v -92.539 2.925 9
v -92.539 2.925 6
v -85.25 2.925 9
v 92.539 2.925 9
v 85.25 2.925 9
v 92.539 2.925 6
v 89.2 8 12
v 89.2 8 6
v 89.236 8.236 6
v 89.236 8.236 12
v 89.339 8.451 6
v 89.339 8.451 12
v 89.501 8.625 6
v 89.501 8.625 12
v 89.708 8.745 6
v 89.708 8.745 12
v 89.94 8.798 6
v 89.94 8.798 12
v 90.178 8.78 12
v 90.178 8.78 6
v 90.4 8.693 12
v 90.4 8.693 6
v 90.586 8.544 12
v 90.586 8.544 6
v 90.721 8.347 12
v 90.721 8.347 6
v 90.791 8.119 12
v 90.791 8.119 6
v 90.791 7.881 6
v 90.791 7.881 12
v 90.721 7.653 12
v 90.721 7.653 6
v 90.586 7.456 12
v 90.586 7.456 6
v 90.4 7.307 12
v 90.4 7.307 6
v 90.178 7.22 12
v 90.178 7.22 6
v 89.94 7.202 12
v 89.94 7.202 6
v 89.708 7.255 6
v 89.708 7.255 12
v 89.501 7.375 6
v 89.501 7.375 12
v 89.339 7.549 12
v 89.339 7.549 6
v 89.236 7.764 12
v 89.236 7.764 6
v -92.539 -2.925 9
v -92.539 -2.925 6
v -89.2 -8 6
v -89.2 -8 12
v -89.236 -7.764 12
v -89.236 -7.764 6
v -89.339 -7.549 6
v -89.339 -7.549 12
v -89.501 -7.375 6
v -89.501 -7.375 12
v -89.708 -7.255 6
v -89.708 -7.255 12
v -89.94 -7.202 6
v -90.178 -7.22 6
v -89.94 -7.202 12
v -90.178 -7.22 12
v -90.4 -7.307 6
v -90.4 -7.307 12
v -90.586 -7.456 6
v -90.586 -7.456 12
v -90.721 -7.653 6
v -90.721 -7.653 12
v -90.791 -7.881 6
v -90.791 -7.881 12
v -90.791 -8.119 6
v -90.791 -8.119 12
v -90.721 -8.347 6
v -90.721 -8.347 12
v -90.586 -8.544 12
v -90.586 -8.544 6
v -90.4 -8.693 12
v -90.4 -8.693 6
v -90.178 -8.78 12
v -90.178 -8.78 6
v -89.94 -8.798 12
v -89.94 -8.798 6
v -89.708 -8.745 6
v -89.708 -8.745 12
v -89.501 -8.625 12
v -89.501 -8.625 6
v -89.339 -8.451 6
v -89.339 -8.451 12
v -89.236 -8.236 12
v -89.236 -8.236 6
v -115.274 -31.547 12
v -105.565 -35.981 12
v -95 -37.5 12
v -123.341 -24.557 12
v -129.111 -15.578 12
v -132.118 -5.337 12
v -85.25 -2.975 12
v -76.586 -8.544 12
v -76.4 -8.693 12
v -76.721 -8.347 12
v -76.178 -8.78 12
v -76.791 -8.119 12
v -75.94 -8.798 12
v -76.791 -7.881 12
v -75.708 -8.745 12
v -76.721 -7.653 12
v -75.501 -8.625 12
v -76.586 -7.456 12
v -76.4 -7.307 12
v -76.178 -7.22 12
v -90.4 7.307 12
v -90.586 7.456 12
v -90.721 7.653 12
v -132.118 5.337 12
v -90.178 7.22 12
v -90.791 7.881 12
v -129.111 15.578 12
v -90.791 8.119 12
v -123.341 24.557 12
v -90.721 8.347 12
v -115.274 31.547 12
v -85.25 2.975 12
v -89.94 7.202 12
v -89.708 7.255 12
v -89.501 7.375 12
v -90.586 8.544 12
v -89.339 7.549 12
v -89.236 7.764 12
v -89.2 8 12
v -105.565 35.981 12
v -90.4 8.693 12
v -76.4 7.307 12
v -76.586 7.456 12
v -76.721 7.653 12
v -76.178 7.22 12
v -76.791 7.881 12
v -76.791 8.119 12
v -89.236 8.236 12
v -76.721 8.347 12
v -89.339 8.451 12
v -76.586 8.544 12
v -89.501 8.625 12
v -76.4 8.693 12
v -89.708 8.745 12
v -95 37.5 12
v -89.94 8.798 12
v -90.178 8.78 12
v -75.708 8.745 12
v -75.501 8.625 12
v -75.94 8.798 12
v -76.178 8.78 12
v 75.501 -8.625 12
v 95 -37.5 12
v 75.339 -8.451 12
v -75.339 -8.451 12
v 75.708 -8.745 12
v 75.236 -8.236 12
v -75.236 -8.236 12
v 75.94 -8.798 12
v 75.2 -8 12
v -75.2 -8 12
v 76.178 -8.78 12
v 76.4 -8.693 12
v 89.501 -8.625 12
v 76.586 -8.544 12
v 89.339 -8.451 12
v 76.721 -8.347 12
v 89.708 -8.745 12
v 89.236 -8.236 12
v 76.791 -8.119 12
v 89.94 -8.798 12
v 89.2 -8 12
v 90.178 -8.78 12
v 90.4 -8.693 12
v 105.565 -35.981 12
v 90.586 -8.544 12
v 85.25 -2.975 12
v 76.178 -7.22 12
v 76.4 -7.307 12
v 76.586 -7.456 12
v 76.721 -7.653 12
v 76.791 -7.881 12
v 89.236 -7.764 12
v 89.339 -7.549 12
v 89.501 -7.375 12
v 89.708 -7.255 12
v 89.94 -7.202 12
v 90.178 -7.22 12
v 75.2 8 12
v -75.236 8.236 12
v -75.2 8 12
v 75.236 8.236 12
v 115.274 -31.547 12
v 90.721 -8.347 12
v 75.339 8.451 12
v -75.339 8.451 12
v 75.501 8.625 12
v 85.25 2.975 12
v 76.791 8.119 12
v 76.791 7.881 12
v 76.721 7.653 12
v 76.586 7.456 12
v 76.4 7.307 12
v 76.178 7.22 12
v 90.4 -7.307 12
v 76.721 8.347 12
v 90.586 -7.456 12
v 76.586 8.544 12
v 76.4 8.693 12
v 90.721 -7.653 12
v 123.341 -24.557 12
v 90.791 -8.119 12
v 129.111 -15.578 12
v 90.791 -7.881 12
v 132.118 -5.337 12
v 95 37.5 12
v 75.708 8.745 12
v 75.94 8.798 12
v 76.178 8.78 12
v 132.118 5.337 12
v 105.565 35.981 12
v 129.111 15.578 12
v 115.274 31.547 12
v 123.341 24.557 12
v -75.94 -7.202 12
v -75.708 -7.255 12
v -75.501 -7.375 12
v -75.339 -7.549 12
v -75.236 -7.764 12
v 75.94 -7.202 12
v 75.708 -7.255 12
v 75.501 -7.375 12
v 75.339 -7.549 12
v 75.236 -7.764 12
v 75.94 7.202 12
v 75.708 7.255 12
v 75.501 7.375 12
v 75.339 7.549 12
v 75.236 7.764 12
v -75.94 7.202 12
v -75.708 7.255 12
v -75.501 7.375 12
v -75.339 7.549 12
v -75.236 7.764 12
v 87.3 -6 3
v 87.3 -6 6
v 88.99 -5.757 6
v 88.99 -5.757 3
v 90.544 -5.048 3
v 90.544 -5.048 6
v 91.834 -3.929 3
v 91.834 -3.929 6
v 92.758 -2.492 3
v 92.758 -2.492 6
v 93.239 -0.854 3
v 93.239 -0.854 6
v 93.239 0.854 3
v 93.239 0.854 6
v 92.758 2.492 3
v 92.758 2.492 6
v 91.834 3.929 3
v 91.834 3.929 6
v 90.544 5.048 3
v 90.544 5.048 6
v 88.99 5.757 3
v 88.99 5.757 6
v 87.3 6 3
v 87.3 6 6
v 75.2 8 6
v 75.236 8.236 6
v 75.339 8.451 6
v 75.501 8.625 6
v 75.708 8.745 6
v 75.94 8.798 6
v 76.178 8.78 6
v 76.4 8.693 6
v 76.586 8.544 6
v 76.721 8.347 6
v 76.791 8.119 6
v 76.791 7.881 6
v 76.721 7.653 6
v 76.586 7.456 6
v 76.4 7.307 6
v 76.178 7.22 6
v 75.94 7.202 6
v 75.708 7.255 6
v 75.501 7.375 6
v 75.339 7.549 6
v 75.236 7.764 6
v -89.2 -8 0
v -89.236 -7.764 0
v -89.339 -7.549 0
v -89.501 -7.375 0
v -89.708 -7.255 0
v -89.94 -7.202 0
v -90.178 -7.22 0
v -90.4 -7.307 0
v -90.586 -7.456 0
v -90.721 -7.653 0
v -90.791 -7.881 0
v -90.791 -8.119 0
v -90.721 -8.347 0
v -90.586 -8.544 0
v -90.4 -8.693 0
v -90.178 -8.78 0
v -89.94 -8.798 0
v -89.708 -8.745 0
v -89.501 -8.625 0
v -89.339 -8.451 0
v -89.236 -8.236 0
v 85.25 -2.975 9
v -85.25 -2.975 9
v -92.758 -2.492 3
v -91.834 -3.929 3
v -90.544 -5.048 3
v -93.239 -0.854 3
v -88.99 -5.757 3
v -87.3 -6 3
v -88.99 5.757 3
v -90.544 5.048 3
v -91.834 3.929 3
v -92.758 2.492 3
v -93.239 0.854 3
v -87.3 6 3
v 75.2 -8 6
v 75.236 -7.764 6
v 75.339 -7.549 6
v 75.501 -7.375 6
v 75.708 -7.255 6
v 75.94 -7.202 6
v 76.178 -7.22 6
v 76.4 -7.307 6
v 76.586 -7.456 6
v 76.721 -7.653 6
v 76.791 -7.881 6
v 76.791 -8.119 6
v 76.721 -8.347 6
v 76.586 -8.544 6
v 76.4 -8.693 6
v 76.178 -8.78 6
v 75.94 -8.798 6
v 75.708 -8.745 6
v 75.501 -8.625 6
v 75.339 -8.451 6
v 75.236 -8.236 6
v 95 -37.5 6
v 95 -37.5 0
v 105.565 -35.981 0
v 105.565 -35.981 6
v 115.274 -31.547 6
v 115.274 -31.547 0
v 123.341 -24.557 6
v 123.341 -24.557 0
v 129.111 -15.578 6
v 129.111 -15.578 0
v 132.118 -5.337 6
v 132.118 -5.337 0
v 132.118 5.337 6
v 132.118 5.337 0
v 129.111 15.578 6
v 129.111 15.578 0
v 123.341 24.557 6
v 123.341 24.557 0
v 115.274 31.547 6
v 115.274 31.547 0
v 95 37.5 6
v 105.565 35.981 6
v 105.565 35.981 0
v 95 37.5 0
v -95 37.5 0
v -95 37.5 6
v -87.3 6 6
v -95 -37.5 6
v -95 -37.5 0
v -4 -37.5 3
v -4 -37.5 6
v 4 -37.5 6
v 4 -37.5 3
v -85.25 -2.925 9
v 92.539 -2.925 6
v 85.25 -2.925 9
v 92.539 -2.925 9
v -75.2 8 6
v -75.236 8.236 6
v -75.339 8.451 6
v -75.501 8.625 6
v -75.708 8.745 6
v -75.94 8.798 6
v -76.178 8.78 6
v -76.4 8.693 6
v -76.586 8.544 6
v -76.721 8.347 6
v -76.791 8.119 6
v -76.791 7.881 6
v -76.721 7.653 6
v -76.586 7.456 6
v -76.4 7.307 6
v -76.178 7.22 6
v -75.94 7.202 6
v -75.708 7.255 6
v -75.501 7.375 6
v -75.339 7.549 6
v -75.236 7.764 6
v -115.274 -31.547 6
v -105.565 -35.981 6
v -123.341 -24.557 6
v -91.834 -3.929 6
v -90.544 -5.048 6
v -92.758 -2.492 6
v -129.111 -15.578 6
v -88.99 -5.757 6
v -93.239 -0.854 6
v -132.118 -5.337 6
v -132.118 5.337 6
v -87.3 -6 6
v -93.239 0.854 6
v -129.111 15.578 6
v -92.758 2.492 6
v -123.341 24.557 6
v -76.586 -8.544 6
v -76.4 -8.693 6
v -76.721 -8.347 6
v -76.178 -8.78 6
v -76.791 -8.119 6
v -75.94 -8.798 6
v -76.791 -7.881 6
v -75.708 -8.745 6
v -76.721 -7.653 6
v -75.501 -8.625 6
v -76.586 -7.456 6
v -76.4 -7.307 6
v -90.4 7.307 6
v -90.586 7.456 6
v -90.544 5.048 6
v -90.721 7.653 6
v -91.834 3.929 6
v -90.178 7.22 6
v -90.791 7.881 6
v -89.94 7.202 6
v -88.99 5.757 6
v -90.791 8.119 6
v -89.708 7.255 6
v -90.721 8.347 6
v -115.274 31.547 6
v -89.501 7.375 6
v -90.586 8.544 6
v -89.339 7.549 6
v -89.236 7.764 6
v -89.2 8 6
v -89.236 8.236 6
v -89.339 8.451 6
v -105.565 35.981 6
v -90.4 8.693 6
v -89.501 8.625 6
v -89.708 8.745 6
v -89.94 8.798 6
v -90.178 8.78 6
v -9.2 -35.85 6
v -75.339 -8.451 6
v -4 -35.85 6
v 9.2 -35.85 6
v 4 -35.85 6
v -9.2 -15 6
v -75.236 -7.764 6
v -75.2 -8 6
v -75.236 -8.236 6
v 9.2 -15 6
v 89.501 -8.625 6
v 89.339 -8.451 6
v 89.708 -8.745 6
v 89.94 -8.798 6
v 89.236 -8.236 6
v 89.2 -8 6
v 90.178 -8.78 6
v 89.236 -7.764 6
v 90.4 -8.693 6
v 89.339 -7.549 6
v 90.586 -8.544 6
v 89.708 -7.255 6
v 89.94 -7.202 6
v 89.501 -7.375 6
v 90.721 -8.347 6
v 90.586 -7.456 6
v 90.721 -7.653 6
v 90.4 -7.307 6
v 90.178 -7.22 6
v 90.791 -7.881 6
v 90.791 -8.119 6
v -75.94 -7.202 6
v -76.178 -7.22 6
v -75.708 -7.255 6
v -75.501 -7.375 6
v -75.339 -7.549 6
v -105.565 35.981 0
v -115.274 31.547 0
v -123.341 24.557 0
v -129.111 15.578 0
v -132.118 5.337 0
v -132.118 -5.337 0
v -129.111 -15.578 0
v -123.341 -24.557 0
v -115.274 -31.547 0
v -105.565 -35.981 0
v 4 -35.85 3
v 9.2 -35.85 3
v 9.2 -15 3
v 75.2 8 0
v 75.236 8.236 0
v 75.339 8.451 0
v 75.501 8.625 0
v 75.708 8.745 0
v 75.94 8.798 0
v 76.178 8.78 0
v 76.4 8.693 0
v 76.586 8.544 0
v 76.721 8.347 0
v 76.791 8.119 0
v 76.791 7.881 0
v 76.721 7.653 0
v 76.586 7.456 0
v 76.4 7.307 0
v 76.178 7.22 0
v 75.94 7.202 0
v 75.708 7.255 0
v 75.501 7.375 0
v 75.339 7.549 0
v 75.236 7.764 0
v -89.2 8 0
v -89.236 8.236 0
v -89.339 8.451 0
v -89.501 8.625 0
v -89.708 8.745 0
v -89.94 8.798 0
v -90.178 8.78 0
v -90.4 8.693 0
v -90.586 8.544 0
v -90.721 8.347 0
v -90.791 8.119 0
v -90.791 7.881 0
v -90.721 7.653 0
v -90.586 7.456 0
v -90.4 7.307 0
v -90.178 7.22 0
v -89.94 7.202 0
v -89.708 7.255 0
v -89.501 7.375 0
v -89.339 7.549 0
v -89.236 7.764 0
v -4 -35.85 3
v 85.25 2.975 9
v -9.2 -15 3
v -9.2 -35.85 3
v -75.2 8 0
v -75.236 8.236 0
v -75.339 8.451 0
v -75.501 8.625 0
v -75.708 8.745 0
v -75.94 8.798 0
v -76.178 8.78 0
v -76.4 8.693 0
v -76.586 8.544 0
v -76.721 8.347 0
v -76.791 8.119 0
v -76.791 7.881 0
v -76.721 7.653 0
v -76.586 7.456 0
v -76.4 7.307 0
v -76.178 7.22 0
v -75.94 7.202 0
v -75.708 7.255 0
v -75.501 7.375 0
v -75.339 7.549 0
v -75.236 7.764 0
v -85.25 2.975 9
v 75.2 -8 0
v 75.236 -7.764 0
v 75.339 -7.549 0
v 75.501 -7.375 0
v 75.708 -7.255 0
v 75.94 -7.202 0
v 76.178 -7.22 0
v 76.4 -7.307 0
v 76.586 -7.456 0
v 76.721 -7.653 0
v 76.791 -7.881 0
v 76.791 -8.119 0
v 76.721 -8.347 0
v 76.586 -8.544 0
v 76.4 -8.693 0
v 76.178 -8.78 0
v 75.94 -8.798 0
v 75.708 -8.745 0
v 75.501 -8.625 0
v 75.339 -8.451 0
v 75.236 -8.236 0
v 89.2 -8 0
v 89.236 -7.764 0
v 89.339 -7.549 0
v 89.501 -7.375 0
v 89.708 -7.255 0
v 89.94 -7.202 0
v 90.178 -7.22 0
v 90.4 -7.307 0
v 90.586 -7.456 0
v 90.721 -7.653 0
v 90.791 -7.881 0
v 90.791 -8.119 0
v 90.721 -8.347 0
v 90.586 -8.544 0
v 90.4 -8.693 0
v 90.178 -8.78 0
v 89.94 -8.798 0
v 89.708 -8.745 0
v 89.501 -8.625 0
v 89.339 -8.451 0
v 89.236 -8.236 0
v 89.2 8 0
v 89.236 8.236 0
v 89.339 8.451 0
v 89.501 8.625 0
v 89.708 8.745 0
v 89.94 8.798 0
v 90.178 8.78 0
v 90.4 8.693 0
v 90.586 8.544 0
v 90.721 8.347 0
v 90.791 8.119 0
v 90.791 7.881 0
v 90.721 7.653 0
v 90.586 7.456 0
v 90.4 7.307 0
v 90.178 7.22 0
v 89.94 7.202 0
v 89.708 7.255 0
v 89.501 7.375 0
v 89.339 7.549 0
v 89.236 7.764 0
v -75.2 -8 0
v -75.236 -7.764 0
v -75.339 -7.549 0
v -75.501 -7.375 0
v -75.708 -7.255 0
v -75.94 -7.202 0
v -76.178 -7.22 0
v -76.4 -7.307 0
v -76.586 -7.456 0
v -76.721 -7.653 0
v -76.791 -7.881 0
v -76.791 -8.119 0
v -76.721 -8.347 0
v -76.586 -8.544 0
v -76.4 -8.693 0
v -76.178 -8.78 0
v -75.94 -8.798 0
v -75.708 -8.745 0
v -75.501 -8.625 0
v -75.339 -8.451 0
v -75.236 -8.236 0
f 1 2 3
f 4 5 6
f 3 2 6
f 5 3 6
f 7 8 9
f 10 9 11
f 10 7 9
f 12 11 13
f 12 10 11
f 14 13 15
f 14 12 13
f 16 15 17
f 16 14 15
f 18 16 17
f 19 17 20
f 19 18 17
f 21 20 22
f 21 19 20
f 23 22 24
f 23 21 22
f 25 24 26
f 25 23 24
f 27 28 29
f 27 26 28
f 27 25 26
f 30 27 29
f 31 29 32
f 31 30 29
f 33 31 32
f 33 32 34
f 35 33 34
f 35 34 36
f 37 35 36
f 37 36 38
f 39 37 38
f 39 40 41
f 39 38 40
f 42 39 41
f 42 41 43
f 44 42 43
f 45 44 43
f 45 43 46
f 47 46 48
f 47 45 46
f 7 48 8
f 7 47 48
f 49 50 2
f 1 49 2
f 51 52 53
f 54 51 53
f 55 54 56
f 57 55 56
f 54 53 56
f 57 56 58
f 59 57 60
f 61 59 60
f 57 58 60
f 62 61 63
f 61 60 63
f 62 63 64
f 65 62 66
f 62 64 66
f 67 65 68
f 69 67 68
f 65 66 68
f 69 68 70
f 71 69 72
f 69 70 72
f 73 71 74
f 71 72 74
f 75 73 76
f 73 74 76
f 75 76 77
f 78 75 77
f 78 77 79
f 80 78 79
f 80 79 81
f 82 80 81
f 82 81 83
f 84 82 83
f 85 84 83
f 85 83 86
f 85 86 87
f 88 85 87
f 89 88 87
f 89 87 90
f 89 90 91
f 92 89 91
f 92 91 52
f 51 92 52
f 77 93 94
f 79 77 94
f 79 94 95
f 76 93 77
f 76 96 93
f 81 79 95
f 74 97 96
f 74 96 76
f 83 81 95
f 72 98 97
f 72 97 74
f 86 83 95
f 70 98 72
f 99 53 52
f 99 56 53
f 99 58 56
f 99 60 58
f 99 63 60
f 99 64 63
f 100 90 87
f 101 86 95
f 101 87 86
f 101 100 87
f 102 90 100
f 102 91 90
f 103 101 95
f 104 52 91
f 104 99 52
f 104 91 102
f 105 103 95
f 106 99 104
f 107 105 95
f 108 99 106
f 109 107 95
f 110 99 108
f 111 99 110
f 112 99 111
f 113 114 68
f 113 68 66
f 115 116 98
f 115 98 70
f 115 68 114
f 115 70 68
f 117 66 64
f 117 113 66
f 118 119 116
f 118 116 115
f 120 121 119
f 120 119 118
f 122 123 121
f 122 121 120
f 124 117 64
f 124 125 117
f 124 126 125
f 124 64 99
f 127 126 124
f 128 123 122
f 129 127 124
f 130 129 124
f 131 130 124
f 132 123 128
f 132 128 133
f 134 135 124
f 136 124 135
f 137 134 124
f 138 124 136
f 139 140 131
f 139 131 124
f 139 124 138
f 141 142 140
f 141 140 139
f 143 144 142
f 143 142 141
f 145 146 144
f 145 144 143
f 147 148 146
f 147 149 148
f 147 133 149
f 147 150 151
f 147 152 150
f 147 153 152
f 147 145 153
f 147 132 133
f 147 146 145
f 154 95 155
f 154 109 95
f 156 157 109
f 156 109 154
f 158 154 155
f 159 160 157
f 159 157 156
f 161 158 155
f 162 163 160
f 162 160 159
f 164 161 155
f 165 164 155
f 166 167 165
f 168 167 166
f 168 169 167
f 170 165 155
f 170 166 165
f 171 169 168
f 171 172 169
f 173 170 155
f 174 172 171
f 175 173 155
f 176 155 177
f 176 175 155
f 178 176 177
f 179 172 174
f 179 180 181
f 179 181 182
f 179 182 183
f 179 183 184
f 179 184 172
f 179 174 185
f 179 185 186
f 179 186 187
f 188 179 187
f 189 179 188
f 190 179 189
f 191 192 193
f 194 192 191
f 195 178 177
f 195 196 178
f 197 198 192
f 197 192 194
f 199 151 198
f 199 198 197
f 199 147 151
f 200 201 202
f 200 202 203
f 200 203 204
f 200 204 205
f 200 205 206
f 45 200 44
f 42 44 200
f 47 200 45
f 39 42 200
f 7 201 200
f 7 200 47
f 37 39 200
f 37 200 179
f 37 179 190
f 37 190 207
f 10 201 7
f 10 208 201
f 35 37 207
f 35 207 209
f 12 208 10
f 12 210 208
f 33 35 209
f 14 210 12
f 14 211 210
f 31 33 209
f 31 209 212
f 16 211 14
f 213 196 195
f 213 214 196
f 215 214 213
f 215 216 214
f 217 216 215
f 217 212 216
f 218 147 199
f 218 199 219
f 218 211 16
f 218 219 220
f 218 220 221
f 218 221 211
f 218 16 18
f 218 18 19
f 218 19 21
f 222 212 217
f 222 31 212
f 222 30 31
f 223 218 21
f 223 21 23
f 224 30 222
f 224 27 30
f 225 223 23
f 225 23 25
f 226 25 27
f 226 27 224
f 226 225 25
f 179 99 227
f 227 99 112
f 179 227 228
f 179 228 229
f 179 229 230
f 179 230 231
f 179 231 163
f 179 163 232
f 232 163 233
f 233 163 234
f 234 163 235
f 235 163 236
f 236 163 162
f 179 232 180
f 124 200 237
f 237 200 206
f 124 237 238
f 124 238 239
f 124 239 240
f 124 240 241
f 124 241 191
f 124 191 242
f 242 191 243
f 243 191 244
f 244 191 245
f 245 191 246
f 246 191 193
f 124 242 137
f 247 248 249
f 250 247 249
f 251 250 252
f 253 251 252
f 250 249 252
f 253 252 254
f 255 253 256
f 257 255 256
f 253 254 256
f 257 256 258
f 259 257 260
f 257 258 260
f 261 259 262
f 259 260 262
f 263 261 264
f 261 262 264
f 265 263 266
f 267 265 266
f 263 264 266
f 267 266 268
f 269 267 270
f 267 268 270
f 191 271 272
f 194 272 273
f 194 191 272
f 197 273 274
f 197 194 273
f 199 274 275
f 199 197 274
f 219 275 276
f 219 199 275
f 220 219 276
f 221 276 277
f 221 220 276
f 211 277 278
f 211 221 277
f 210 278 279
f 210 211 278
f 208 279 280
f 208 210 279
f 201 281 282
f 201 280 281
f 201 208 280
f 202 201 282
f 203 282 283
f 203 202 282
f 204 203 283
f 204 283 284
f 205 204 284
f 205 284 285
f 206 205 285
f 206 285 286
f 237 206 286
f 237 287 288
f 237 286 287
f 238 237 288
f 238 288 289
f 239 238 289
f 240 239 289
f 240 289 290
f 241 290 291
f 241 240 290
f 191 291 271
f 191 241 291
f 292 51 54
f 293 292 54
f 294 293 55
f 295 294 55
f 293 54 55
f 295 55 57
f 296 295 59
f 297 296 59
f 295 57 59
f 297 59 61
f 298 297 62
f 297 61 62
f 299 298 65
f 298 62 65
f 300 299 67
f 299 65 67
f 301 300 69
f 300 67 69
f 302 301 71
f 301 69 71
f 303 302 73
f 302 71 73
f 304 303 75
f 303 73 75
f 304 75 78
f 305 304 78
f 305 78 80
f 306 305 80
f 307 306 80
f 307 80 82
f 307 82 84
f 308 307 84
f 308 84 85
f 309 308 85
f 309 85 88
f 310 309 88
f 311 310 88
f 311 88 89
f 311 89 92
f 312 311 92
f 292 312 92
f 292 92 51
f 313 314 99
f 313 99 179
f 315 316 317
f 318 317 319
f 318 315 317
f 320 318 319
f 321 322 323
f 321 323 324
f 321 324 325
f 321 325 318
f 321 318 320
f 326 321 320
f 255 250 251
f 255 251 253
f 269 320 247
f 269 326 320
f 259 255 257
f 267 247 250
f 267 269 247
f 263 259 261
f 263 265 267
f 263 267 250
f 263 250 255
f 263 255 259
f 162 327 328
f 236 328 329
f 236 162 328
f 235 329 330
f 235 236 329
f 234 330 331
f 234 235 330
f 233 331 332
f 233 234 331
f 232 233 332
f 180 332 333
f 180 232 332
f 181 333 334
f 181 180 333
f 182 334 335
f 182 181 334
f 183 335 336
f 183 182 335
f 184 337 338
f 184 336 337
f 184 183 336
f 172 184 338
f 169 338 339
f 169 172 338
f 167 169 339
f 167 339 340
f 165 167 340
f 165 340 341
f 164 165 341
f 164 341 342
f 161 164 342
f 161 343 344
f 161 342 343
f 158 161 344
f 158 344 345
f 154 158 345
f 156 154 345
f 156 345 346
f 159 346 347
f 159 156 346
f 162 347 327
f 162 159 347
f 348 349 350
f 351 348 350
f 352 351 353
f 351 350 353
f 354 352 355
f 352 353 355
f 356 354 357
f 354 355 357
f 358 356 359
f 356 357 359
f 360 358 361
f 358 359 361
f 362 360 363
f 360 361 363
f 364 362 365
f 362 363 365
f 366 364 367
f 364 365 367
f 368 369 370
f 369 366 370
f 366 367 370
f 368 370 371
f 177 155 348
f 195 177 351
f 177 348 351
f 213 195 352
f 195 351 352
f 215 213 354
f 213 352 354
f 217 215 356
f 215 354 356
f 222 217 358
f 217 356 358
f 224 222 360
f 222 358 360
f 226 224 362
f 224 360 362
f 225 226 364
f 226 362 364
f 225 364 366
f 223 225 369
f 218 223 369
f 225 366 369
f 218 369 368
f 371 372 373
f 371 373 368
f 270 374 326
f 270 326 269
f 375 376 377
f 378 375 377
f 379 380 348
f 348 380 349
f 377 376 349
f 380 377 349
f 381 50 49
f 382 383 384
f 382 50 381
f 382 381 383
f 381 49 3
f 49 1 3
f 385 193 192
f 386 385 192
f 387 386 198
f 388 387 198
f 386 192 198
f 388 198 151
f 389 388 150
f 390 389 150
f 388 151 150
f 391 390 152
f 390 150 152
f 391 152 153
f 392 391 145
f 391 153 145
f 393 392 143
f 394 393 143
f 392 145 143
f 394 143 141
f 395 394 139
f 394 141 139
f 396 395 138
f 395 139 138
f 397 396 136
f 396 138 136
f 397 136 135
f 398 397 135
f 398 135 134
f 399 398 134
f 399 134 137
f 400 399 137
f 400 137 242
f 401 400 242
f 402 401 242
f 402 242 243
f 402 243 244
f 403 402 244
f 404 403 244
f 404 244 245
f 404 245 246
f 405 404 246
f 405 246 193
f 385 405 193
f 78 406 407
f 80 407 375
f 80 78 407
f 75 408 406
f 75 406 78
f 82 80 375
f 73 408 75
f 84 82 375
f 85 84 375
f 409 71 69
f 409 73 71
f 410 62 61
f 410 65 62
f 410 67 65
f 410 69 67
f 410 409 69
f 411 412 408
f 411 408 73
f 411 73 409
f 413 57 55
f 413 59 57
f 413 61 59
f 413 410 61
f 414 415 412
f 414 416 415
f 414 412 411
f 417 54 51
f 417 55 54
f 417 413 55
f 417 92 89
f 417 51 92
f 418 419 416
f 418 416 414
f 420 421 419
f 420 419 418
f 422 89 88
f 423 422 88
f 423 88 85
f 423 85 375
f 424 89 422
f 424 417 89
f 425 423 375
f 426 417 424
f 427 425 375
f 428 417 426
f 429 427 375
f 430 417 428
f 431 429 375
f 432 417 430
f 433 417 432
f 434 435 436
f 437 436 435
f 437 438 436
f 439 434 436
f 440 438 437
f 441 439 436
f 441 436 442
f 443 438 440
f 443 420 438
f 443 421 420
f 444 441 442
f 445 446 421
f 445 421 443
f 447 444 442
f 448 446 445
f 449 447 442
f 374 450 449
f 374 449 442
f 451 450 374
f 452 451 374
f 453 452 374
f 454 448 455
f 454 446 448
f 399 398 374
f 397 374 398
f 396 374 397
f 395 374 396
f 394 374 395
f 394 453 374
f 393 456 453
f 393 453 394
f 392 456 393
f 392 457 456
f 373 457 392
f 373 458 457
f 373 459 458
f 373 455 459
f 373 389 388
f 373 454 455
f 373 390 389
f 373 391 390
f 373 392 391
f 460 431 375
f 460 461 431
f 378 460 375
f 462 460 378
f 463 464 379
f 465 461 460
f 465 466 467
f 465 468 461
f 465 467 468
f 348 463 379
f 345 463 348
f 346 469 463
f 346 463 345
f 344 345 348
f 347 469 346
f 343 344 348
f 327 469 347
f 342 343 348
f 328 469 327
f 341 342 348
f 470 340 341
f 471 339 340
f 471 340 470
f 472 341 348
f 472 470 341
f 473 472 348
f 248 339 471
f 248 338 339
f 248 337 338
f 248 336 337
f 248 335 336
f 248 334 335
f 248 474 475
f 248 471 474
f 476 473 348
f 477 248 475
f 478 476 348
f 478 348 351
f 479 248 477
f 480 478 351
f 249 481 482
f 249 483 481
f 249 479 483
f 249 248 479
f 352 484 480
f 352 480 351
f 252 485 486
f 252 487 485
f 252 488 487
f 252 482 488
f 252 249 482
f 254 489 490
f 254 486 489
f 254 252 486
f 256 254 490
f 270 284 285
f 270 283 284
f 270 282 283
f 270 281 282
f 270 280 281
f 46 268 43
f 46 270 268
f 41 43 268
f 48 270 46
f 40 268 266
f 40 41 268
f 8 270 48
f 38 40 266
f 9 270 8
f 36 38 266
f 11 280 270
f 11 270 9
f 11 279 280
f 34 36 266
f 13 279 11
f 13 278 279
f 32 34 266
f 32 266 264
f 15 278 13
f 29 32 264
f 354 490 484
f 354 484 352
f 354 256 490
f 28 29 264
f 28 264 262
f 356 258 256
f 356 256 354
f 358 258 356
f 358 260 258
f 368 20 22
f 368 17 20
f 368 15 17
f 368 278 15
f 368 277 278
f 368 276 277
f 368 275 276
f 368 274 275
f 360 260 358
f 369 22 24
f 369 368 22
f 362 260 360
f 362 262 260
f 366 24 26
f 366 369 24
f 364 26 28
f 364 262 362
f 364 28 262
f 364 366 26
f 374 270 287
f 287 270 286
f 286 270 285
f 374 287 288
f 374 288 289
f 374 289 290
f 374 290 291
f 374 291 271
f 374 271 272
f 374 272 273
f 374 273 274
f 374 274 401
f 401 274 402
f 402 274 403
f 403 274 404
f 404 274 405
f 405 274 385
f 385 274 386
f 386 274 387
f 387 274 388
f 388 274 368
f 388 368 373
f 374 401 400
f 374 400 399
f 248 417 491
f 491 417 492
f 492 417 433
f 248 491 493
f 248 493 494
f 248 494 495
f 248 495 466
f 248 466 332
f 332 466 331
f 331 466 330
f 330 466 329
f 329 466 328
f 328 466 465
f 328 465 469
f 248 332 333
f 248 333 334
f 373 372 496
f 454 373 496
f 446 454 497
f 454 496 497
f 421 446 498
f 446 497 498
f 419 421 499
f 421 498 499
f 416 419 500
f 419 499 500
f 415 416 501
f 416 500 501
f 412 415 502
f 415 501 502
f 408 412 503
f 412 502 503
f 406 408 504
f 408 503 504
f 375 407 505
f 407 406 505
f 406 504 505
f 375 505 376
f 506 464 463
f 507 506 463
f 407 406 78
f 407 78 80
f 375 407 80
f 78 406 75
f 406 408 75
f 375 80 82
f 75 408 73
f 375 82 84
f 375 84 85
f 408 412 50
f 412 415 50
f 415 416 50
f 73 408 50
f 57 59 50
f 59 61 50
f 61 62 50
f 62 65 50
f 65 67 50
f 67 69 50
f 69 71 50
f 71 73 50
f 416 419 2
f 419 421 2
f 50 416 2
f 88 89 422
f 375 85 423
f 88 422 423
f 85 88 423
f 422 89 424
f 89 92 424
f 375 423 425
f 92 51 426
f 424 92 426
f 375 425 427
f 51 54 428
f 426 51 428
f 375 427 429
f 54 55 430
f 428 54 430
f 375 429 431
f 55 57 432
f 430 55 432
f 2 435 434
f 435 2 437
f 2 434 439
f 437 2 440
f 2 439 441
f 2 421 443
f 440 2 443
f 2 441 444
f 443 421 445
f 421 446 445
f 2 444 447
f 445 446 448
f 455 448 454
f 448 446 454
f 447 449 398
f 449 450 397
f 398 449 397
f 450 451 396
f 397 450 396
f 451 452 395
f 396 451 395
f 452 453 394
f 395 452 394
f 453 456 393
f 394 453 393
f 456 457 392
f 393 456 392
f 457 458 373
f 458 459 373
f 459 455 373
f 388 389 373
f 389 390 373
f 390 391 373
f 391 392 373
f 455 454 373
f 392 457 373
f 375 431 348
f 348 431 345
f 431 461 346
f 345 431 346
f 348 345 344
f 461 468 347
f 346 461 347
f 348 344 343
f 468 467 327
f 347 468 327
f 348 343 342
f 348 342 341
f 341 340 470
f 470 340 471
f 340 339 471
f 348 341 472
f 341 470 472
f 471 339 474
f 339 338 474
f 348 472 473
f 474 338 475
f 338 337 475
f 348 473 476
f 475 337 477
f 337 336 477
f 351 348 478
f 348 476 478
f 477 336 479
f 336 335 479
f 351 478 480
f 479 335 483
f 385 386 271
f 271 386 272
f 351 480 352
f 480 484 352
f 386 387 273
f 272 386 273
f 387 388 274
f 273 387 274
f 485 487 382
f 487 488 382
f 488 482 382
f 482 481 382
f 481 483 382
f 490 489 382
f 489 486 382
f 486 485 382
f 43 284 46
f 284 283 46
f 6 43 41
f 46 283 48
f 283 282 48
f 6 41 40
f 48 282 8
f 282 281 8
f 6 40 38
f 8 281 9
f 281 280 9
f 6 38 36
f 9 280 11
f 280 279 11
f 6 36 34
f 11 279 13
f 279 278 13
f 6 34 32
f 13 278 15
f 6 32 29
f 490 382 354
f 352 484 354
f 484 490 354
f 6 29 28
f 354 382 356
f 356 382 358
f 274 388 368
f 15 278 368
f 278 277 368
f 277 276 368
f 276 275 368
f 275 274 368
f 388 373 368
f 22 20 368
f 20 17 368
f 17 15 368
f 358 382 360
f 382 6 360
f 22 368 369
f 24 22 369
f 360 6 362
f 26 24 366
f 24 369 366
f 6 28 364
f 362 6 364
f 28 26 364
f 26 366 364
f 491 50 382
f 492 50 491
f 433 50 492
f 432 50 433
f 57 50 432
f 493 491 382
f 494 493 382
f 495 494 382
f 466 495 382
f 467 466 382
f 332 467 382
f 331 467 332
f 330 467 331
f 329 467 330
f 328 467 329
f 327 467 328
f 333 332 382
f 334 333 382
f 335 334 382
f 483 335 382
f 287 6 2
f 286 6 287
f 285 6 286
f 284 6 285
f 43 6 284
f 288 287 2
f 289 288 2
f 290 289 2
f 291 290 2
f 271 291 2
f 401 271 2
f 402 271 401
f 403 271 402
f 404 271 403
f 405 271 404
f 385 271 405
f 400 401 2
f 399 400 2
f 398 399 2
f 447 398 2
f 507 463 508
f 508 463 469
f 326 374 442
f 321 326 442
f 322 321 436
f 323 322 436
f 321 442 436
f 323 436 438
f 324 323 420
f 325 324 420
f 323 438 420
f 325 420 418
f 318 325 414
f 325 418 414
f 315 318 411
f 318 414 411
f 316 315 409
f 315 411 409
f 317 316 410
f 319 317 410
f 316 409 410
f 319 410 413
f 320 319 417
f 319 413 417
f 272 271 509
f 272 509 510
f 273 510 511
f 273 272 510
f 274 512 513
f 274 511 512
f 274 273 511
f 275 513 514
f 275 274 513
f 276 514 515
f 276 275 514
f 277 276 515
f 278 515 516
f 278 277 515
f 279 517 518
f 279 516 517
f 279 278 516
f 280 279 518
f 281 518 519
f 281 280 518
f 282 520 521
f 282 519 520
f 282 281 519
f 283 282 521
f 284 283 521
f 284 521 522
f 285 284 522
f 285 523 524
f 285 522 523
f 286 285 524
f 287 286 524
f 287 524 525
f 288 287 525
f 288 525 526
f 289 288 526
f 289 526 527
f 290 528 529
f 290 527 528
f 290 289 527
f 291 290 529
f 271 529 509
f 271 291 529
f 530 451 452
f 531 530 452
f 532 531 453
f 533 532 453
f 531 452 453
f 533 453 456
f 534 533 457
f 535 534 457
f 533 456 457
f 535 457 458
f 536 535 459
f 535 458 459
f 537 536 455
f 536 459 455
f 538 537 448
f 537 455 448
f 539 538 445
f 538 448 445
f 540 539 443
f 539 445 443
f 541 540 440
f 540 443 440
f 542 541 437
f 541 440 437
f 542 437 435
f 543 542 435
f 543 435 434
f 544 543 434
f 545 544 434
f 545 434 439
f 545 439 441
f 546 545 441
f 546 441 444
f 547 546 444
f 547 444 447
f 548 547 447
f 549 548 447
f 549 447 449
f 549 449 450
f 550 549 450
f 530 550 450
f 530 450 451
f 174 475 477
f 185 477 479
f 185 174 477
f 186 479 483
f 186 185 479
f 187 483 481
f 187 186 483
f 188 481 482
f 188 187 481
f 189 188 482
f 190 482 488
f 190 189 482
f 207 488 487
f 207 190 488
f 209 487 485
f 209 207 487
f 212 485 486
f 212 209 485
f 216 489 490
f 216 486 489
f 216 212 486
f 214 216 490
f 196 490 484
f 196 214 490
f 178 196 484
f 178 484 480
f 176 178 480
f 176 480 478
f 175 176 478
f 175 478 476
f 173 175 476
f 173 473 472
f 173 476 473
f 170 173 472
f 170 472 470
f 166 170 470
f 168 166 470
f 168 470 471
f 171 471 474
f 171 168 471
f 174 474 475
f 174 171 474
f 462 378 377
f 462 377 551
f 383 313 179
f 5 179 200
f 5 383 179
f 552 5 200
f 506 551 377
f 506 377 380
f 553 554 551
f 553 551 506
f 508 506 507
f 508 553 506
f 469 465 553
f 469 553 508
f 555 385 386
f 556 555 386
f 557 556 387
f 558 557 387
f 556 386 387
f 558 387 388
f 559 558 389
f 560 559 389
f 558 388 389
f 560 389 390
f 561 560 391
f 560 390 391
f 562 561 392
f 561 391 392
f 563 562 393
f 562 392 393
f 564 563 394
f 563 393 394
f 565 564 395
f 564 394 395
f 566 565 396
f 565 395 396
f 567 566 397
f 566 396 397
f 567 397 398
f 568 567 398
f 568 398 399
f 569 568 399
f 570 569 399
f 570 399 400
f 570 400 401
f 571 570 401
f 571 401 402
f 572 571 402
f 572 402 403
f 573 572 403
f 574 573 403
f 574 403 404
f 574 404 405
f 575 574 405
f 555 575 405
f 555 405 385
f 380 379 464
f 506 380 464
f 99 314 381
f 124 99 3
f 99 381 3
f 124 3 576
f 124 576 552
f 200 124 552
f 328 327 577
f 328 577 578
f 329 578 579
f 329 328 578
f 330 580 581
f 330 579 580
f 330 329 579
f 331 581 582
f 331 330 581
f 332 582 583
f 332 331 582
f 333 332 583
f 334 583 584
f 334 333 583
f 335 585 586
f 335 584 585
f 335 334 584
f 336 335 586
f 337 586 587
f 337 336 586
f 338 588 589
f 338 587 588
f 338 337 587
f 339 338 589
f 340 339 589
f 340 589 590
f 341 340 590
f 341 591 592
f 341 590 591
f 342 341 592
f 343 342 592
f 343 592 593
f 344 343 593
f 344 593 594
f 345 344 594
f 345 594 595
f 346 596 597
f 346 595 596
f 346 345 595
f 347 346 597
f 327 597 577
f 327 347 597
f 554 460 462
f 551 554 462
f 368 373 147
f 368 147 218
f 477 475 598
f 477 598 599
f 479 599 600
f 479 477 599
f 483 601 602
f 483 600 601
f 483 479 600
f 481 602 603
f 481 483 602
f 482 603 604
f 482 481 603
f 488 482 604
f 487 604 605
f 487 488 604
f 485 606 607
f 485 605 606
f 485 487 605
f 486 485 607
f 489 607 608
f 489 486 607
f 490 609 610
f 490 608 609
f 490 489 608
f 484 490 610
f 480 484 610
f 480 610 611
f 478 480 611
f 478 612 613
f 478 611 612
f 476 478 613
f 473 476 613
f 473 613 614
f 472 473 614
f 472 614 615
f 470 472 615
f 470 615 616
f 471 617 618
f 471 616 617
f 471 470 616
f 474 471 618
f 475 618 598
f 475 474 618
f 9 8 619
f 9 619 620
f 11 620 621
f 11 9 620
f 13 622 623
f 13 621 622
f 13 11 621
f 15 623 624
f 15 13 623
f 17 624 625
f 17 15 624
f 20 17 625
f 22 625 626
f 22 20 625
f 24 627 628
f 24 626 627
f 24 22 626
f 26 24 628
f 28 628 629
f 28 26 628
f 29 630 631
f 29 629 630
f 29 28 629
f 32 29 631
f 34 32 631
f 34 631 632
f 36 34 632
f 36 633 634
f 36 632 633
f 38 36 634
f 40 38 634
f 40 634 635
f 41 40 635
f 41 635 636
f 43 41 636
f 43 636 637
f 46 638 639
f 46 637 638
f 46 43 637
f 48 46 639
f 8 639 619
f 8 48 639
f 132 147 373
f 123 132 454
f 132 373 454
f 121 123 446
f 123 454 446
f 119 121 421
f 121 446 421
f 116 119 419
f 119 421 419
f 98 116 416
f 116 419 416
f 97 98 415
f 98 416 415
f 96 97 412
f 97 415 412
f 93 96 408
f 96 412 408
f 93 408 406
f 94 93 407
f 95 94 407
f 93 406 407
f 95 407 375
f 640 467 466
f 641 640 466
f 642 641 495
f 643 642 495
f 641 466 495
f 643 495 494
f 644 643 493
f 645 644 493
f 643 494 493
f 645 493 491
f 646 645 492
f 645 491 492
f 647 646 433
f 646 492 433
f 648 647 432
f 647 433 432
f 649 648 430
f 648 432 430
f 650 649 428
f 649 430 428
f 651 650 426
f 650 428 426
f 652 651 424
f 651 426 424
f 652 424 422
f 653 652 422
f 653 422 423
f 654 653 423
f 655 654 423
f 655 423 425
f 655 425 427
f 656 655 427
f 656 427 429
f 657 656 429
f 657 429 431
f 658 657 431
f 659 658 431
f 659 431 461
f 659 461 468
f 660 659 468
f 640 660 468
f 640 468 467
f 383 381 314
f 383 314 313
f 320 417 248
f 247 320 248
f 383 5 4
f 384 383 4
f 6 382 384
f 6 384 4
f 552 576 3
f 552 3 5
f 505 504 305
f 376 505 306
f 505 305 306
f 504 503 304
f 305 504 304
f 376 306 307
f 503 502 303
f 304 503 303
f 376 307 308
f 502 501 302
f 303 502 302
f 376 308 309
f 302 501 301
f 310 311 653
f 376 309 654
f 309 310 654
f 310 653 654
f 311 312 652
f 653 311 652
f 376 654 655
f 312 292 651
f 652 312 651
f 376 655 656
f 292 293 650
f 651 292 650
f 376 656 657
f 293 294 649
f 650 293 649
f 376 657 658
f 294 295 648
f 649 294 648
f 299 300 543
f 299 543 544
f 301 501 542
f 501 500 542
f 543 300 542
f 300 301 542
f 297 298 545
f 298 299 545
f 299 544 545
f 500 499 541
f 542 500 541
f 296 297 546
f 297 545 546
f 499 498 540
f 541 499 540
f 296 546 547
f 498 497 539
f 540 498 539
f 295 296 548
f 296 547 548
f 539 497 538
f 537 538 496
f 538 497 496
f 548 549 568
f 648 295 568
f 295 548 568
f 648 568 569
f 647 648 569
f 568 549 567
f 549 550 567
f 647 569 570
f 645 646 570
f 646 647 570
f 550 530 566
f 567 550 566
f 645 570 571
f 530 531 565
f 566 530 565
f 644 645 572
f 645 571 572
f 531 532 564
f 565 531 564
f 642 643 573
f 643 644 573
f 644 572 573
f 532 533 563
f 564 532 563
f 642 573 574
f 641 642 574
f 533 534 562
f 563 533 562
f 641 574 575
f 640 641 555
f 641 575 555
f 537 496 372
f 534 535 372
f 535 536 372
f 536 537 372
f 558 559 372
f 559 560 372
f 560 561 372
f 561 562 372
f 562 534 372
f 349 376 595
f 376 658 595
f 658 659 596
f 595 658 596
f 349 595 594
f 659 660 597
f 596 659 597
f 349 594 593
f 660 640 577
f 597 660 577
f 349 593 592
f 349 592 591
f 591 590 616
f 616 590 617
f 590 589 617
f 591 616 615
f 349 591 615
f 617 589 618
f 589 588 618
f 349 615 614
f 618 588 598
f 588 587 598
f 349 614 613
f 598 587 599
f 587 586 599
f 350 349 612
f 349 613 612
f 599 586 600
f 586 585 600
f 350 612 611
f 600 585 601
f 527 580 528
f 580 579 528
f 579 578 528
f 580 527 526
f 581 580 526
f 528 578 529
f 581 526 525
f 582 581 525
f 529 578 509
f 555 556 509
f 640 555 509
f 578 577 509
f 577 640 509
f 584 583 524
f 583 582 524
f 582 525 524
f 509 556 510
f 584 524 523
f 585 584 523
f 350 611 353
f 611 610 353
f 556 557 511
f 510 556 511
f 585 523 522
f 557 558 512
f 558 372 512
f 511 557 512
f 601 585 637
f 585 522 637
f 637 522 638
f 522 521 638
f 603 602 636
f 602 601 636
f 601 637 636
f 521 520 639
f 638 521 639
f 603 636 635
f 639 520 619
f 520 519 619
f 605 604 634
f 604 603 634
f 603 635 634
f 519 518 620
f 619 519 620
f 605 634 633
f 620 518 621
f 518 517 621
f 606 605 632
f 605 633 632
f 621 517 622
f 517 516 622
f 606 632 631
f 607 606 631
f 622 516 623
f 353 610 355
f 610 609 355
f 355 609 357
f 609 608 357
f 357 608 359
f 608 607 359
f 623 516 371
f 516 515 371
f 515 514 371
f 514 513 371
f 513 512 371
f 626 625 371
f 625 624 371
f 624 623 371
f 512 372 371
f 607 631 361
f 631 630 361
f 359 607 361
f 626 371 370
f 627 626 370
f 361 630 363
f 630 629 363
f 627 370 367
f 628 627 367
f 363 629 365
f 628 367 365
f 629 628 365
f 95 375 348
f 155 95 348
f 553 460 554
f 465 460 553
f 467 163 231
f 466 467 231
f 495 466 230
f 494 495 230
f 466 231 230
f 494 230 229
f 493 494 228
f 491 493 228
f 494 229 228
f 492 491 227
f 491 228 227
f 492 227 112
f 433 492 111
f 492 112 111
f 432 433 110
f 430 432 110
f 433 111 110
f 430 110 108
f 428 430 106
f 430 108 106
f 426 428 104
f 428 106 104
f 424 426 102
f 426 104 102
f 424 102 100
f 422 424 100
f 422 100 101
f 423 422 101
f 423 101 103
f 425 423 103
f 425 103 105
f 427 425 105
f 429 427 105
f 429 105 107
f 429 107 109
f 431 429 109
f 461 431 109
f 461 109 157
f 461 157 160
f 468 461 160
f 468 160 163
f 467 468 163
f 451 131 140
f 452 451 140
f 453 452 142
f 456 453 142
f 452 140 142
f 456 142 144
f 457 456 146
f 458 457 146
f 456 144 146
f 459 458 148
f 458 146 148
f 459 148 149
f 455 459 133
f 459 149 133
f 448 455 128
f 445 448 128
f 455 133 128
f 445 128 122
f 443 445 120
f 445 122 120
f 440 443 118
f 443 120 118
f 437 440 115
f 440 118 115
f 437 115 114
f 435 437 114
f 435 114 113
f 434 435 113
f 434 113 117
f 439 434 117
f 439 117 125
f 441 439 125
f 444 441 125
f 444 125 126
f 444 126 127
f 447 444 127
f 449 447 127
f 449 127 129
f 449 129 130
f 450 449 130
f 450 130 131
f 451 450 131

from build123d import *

# Parameters (mm, degrees)
BOX_BOTTOM_HALF_0_W     = 266.988319
BOX_BOTTOM_HALF_0_H     = 77
BOX_BOTTOM_HALF_0_DEPTH = 7
PAD_DEPTH               = 6
POCKET_DEPTH            = 3
SKETCH002_W             = 18.4
SKETCH002_H             = 20.85
POCKET001_DEPTH         = 3
SKETCH003_W             = 8
SKETCH003_H             = 1.65
POCKET002_DEPTH         = 3
SKETCH004_W             = 185.077476
SKETCH004_H             = 5.85
PAD001_DEPTH            = 3
SKETCH005_W             = 170.5
SKETCH005_H             = 5.95
PAD002_DEPTH            = 3
SKETCH007_R             = 0.8
POCKET003_DEPTH         = 563.341185


with BuildPart() as box_bottom_half_0_body:
    # box_bottom_half_0 → box_bottom_half_0 (new body)
    with BuildSketch(Plane(origin=(-133.49416, -38.5, -1), x_dir=(1, 0, 0), z_dir=(0, 0, 1))):
        with Locations((133.494159, 38.5)):
            Rectangle(BOX_BOTTOM_HALF_0_W, BOX_BOTTOM_HALF_0_H)
    extrude(amount=BOX_BOTTOM_HALF_0_DEPTH)


with BuildPart() as body:
    # Sketch → Pad (new body)
    with BuildSketch(Plane.XY):
        with BuildLine():
            ThreePointArc((-95, 37.5), (-132.5, 0), (-95, -37.5))
            Line((-95, -37.5), (95, -37.5))
            ThreePointArc((95, -37.5), (132.5, 0), (95, 37.5))
            Line((-95, 37.5), (95, 37.5))
        make_face()
    extrude(amount=PAD_DEPTH)

    # Sketch001 (on Face6 of Pad) → Pocket (cut)
    with BuildSketch(Plane.XY.offset(6)):
        with BuildLine():
            ThreePointArc((-87.3, 6), (-93.3, 0), (-87.3, -6))
            Line((-87.3, -6), (87.3, -6))
            ThreePointArc((87.3, -6), (93.3, 0), (87.3, 6))
            Line((-87.3, 6), (87.3, 6))
        make_face()
    extrude(amount=-POCKET_DEPTH, mode=Mode.SUBTRACT)

    # Sketch002 (on Face5 of Pocket) → Pocket001 (cut)
    with BuildSketch(Plane.XY.offset(6)):
        with Locations((0, -25.425)):
            Rectangle(SKETCH002_W, SKETCH002_H)
    extrude(amount=-POCKET001_DEPTH, mode=Mode.SUBTRACT)

    # Sketch003 (on Face5 of Pocket001) → Pocket002 (cut)
    with BuildSketch(Plane.XY.offset(6)):
        with Locations((0, -36.675)):
            Rectangle(SKETCH003_W, SKETCH003_H)
    extrude(amount=-POCKET002_DEPTH, mode=Mode.SUBTRACT)

    # Sketch004 (on Face5 of Pocket002) → Pad001 (join)
    with BuildSketch(Plane.XY.offset(6)):
        with BuildLine():
            ThreePointArc((-95, 37.5), (-132.5, 0), (-95, -37.5))
            Line((-95, -37.5), (95, -37.5))
            ThreePointArc((95, -37.5), (132.5, 0), (95, 37.5))
            Line((-95, 37.5), (95, 37.5))
        make_face()
        Rectangle(SKETCH004_W, SKETCH004_H, mode=Mode.SUBTRACT)
    extrude(amount=PAD001_DEPTH)

    # Sketch005 (on Face12 of Pad001) → Pad002 (join)
    with BuildSketch(Plane.XY.offset(9)):
        with BuildLine():
            ThreePointArc((-95, 37.5), (-132.5, 0), (-95, -37.5))
            Line((-95, -37.5), (95, -37.5))
            ThreePointArc((95, -37.5), (132.5, 0), (95, 37.5))
            Line((-95, 37.5), (95, 37.5))
        make_face()
        Rectangle(SKETCH005_W, SKETCH005_H, mode=Mode.SUBTRACT)
    extrude(amount=PAD002_DEPTH)

    # Sketch007 (on Face20 of Pad002) → Pocket003 (cut, through all)
    with BuildSketch(Plane.XY.offset(12)):
        with Locations((-90, -8)):
            Circle(SKETCH007_R)
        with Locations((-90, 8)):
            Circle(SKETCH007_R)
        with Locations((-76, 8)):
            Circle(SKETCH007_R)
        with Locations((-76, -8)):
            Circle(SKETCH007_R)
    pocket003 = extrude(amount=-POCKET003_DEPTH, mode=Mode.SUBTRACT)

    # Mirrored: Pocket003 across Sketch007 V_Axis
    add(pocket003.mirror(Plane(origin=(0, 0, 12), x_dir=(0, 0, 1), z_dir=(1, 0, 0))), mode=Mode.SUBTRACT)


with BuildPart() as bottom_half_0_body:
    # bottom_half_0 base: copy of Body
    add(body.part)

    # bottom_half_0: intersect box_bottom_half_0 body
    add(box_bottom_half_0_body.part, mode=Mode.INTERSECT)


with BuildPart() as top_half_0_body:
    # top_half_0 base: copy of Body
    add(body.part)

    # top_half_0: cut box_bottom_half_0 body
    add(box_bottom_half_0_body.part, mode=Mode.SUBTRACT)


solid = Compound([bottom_half_0_body.part, top_half_0_body.part])
